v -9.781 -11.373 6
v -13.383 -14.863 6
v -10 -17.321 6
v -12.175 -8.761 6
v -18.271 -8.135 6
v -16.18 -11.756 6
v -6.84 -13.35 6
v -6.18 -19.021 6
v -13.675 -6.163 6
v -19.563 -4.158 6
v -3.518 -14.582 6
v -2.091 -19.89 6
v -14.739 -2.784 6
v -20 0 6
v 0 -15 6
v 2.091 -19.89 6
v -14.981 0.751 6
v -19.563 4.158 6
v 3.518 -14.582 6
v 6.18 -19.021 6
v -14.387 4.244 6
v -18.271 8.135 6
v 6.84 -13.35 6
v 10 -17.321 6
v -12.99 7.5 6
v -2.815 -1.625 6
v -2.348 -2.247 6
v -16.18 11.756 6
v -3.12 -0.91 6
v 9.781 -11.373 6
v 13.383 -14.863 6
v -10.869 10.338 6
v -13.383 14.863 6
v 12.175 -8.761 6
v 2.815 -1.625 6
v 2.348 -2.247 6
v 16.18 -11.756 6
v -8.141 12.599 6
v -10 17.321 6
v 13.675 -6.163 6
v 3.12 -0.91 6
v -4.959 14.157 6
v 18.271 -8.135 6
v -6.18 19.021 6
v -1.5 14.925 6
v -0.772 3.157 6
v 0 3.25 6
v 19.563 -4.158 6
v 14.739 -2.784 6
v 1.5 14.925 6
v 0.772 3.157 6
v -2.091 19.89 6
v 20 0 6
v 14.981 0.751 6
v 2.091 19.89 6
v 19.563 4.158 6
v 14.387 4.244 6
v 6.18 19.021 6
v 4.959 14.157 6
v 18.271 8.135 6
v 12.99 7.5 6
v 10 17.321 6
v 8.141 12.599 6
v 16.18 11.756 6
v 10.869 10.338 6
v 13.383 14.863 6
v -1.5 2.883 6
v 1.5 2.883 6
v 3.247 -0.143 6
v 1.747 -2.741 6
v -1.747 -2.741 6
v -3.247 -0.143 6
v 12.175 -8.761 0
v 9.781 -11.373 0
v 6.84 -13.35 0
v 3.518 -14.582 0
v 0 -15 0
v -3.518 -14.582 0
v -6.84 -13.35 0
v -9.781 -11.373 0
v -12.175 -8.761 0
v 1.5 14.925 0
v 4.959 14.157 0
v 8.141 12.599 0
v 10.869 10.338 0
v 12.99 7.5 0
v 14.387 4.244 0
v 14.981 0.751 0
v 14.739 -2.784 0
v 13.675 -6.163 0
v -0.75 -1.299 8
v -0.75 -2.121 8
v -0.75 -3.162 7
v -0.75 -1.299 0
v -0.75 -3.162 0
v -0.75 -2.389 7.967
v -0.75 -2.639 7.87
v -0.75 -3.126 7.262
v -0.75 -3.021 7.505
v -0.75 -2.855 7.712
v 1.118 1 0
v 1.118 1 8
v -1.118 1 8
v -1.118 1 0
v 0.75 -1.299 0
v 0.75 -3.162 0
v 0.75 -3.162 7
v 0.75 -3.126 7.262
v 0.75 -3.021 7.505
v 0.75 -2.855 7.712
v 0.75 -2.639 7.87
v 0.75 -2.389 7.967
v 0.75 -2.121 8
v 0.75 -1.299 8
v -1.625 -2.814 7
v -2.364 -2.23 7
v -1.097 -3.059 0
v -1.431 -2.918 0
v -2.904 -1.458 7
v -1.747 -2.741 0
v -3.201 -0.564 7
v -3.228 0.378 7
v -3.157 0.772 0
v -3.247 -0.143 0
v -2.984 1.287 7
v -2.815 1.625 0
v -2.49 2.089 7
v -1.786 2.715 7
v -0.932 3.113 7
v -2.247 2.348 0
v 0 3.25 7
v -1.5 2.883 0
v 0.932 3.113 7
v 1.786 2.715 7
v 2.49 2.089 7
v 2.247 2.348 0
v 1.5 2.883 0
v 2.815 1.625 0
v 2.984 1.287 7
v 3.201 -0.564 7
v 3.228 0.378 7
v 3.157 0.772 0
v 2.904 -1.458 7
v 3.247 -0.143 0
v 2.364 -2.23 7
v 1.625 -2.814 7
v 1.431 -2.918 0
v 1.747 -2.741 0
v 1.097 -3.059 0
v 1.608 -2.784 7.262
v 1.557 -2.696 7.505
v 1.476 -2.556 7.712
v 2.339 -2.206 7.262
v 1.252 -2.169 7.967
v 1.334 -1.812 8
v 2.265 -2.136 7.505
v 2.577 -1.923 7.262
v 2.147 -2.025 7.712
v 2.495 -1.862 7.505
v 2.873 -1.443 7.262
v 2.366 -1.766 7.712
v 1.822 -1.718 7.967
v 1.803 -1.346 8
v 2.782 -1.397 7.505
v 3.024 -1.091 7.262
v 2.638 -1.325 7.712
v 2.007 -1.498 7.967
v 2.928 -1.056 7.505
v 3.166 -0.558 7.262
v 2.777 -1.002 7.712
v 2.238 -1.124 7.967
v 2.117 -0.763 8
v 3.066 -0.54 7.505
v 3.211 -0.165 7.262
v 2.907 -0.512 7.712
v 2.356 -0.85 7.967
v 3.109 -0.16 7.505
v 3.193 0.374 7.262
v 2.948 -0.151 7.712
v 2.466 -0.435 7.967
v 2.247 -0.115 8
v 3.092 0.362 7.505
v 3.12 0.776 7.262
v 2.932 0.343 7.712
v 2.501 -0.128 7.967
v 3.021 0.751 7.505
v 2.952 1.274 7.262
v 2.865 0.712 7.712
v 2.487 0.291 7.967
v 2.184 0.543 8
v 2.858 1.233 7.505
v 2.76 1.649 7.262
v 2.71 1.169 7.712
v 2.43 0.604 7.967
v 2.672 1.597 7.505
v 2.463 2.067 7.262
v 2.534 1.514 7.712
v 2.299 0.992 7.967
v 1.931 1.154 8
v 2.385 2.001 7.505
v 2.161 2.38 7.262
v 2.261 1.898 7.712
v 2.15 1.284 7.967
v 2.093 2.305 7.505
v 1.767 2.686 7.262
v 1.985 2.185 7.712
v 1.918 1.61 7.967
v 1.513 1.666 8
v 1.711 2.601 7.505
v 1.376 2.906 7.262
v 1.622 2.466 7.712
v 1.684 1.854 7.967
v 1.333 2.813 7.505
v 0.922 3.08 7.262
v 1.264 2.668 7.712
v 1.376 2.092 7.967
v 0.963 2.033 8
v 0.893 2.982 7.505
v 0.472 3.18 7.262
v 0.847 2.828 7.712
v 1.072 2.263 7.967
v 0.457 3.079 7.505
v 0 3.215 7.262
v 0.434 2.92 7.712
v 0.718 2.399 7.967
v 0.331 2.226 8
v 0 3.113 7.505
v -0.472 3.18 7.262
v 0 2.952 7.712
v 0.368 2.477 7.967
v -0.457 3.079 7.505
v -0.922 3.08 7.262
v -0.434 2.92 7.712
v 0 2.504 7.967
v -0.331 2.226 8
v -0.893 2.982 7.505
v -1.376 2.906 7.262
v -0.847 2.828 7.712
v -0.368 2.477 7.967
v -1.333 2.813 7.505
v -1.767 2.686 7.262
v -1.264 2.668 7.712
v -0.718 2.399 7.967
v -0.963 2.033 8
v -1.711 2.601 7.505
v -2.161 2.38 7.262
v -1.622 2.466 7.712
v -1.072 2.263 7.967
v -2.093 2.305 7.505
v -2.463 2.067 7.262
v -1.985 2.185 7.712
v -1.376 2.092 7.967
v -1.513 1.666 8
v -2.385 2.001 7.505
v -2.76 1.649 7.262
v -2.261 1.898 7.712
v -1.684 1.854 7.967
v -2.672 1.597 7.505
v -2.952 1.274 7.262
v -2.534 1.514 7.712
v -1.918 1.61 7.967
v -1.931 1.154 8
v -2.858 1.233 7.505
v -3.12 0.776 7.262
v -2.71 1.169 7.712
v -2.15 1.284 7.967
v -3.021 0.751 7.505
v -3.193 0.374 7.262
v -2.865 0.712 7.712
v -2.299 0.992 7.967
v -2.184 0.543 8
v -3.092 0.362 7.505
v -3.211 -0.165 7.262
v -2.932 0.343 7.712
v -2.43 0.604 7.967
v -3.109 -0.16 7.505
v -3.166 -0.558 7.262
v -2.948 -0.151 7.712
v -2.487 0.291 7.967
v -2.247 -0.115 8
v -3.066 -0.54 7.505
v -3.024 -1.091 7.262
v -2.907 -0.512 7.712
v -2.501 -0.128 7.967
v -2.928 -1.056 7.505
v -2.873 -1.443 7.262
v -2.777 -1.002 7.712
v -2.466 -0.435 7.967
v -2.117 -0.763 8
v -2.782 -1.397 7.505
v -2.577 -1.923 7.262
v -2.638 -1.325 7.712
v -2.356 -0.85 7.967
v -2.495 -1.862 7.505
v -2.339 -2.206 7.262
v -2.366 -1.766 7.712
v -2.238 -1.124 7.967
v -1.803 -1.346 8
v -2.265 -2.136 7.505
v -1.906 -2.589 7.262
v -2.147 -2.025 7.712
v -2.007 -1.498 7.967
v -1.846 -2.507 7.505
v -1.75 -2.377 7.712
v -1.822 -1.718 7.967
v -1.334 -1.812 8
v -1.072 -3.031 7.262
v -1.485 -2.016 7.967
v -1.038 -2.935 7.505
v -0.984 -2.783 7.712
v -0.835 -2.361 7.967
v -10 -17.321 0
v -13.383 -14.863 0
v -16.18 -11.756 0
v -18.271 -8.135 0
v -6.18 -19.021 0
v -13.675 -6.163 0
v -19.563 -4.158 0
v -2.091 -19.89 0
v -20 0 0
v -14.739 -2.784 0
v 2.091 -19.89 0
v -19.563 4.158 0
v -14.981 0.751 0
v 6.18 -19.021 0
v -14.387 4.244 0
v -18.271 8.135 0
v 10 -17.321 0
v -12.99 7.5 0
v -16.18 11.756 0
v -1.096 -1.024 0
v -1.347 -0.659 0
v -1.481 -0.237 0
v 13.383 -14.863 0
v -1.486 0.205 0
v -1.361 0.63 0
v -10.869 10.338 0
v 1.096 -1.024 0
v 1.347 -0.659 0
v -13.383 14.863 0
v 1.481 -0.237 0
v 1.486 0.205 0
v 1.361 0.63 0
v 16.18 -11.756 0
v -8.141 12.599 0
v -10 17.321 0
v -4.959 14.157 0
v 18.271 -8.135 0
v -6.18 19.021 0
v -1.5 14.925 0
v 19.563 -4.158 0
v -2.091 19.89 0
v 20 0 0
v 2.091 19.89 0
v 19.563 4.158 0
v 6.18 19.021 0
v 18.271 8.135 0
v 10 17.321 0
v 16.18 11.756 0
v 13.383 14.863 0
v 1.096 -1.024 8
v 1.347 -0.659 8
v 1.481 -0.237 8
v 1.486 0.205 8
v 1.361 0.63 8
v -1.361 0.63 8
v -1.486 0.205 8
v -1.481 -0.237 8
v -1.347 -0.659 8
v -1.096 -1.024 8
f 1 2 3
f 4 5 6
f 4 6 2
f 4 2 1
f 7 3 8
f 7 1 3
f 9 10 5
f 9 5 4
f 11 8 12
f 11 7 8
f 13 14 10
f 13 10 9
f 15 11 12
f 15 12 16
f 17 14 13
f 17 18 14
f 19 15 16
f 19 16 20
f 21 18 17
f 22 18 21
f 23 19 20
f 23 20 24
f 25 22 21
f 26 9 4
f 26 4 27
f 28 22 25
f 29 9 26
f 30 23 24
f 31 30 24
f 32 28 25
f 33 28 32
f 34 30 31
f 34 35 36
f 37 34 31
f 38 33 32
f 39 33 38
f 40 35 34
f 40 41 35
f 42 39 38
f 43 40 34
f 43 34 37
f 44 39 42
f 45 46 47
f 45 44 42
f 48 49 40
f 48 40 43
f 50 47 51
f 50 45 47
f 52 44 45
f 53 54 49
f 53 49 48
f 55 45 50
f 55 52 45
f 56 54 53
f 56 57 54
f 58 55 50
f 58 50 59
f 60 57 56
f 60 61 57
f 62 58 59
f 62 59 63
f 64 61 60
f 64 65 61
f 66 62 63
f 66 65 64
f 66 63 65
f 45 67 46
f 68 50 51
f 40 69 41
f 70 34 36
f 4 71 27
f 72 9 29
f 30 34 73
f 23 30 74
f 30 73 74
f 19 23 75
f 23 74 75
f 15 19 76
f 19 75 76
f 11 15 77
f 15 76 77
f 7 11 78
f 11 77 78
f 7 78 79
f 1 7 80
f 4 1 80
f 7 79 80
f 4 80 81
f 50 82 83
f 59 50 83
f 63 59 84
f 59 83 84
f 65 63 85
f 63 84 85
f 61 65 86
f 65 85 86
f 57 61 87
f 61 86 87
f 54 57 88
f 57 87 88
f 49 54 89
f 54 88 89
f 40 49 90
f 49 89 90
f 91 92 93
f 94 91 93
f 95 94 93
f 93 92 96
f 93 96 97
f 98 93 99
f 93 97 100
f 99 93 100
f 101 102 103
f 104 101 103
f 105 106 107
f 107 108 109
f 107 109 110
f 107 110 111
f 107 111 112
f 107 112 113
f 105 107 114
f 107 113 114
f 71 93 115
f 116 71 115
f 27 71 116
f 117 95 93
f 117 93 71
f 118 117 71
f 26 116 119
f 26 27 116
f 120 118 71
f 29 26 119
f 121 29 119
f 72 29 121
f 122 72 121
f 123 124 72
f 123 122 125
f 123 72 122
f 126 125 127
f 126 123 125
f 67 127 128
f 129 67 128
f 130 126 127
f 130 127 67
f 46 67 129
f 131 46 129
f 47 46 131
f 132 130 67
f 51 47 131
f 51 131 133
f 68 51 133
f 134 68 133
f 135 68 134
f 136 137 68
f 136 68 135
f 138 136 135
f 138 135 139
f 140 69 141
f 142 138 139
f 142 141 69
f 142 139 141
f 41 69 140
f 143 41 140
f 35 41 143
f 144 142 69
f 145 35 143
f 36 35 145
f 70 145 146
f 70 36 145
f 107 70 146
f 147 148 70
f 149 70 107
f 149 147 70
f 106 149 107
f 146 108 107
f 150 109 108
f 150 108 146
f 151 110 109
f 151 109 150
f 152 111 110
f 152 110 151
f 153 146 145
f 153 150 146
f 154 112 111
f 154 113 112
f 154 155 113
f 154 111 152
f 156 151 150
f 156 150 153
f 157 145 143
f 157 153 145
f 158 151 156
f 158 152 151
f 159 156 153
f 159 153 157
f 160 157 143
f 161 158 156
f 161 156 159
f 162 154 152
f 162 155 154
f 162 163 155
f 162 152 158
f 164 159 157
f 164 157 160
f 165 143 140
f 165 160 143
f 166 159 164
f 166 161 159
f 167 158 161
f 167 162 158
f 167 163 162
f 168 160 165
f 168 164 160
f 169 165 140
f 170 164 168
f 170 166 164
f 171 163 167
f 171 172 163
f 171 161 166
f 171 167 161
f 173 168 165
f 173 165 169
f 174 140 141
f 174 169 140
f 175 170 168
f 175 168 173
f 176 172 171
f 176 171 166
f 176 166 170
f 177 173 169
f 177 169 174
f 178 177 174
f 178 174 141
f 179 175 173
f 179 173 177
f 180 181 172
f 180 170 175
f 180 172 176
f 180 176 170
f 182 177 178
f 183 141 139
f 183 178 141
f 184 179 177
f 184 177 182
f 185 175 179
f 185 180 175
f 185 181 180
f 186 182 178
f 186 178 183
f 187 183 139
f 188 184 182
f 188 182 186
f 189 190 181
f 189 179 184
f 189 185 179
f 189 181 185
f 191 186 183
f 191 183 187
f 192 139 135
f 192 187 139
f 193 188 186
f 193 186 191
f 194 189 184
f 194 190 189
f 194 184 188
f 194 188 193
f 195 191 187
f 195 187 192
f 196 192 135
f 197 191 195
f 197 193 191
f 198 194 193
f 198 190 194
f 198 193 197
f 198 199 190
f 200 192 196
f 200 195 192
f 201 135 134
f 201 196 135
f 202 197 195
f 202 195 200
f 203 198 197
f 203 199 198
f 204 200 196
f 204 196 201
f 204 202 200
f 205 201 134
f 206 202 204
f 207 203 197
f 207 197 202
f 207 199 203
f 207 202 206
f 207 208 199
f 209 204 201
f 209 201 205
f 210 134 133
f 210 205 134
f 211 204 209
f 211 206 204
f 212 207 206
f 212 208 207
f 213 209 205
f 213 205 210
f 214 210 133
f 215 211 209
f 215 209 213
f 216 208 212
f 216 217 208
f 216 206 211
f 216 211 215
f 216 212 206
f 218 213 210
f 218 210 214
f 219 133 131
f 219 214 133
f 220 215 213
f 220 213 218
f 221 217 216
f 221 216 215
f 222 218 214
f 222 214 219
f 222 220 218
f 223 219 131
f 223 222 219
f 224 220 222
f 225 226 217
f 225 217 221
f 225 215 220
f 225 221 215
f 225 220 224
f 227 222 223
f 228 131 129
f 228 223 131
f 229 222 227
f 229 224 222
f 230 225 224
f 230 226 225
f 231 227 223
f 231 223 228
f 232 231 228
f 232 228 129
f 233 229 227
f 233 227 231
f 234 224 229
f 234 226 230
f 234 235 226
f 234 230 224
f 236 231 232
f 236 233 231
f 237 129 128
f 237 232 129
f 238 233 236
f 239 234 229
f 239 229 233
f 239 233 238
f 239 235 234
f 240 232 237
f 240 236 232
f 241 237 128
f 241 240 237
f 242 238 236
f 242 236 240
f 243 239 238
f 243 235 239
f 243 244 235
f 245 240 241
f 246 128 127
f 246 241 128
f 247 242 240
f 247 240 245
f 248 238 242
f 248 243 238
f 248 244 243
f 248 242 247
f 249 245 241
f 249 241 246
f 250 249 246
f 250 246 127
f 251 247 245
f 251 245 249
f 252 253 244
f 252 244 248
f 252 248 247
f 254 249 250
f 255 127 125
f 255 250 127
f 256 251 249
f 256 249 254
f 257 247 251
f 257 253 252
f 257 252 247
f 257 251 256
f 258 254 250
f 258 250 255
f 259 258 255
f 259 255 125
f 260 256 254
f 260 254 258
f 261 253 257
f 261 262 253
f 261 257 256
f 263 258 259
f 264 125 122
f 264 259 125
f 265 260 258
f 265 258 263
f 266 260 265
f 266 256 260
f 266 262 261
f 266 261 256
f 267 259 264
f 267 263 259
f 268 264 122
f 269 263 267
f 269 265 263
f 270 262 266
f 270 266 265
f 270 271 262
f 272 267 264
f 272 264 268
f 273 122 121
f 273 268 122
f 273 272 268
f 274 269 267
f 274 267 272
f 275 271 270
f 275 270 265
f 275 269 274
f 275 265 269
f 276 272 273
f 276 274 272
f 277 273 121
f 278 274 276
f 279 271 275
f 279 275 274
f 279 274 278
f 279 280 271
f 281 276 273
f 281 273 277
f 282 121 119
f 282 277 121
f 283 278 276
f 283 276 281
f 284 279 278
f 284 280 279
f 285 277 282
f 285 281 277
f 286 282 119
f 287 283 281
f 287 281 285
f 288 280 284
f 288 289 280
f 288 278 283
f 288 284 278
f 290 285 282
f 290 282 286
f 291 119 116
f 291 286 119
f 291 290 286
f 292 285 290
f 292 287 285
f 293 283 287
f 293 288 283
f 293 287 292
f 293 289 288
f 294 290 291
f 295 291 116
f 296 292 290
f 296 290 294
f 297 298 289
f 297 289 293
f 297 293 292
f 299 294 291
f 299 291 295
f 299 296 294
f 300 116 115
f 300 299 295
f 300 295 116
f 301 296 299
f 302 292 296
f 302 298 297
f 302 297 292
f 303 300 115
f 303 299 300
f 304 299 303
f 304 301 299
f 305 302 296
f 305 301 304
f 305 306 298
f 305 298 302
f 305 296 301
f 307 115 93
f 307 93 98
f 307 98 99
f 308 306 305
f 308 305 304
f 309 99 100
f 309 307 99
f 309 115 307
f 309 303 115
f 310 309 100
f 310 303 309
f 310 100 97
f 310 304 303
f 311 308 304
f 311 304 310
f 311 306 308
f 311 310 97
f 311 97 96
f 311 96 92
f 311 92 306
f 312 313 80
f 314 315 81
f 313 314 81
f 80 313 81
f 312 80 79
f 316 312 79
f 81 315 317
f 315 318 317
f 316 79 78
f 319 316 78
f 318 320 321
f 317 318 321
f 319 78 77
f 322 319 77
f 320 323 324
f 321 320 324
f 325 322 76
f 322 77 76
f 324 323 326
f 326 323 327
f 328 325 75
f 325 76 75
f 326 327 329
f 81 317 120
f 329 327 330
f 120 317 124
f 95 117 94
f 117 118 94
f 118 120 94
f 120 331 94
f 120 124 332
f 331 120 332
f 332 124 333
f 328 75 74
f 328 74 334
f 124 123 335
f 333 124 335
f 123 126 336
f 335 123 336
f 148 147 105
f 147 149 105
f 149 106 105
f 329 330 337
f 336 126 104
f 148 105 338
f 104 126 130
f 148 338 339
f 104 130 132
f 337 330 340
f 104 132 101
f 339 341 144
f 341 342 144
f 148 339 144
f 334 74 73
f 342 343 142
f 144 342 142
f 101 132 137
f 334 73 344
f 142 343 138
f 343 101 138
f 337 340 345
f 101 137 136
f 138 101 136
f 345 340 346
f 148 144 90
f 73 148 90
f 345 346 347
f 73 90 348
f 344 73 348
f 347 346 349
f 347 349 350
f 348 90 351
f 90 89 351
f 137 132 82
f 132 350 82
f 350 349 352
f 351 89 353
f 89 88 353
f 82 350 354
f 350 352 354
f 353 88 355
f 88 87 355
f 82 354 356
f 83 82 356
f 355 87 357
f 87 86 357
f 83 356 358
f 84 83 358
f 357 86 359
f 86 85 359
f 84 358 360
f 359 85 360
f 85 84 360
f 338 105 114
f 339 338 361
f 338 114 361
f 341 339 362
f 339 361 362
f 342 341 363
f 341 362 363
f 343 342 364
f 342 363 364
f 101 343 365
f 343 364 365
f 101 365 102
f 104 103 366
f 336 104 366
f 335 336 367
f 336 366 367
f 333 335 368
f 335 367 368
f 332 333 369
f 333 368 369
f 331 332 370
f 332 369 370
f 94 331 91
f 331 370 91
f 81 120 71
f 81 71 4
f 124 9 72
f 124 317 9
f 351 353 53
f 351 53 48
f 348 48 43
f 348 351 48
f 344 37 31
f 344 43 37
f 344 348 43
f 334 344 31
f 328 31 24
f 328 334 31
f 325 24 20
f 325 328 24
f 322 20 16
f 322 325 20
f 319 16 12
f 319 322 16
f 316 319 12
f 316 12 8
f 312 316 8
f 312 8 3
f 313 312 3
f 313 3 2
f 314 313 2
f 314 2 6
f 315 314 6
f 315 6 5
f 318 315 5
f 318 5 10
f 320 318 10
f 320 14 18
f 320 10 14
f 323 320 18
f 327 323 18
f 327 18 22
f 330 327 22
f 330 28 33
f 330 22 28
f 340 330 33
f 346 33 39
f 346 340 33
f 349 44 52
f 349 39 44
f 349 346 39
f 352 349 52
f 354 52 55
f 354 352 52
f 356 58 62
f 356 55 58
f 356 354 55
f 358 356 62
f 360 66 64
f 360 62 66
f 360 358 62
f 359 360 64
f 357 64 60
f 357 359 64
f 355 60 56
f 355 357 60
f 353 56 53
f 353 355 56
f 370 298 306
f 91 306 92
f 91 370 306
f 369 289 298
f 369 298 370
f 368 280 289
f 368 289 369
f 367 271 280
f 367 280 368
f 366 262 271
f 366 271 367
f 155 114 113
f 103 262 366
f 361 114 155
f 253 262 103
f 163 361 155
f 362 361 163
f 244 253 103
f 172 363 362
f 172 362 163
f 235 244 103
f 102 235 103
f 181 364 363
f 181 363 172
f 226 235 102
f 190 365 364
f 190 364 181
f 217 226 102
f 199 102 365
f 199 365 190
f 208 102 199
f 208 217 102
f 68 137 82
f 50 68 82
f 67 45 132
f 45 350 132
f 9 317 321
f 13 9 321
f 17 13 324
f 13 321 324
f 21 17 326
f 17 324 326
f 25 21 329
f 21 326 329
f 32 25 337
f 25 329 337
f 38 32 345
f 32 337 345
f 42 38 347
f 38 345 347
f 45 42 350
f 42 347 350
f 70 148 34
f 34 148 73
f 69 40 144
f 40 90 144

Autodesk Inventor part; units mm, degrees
ref_plane "YZ Plane" through (0, 0, 0) normal (1, 0, 0) x (0, 1, 0)
ref_plane "XZ Plane" through (0, 0, 0) normal (0, 1, 0) x (-1, 0, 0)
ref_plane "XY Plane" through (0, 0, 0) normal (0, 0, 1) x (1, 0, 0)
sketch "Эскиз1" plane through (0, 0, 0) normal (0, 0, 1) x (1, 0, 0)
  circle A0 centre (0, 0) radius 20
  circle A1 centre (0, 0) radius 15
  circle A2 centre (0, 0) radius 3.25
  line L0 (0, 15) -> (12.9904, -7.5)
  line L1 (12.9904, -7.5) -> (-12.9904, -7.5)
  line L2 (-12.9904, -7.5) -> (0, 15)
  line L3 (1.5, -15) -> (1.5, 15)
  line L4 (1.5, 15) -> (-1.5, 15)
  line L5 (-1.5, 15) -> (-1.5, -15)
  line L6 (-1.5, -15) -> (1.5, -15)
  line L7 (1.5, -15) -> (-1.5, 15) construction
  line L8 (1.5, 15) -> (-1.5, -15) construction
  line L9 (13.7404, 6.201) -> (-12.2404, -8.799)
  line L10 (-12.2404, -8.799) -> (-13.7404, -6.201)
  line L11 (-13.7404, -6.201) -> (12.2404, 8.799)
  line L12 (12.2404, 8.799) -> (13.7404, 6.201)
  line L13 (13.7404, 6.201) -> (-13.7404, -6.201) construction
  line L14 (-12.2404, -8.799) -> (12.2404, 8.799) construction
  line L15 (-13.7404, 6.201) -> (12.2404, -8.799)
  line L16 (12.2404, -8.799) -> (13.7404, -6.201)
  line L17 (13.7404, -6.201) -> (-12.2404, 8.799)
  line L18 (-12.2404, 8.799) -> (-13.7404, 6.201)
  line L19 (-13.7404, 6.201) -> (13.7404, -6.201) construction
  line L20 (12.2404, -8.799) -> (-12.2404, 8.799) construction
  point P0 (1.5, 14.9248)
  point P1 (13.6753, -6.1634)
  point P2 (3.2469, -0.1425)
  point P3 (1.5, 2.8831)
  point P4 (1.7469, -2.7406)
  point P5 (12.1753, -8.7614)
  point P6 (-12.1753, -8.7614)
  point P7 (-1.7469, -2.7406)
  point P8 (-1.5, 14.9248)
  point P9 (-1.5, 2.8831)
  point P10 (-3.2469, -0.1425)
  point P11 (-13.6753, -6.1634)
  dimension "d1" = 30
  dimension "d0" = 40
  dimension "d2" = 6.5
  dimension "d3" = 3
  dimension "d4" = 3
  dimension "d5" = 3
extrude "Выдавливание1" add sketch "Эскиз1" along normal blind 6 contours A0 | A1 L12 L9 | L17 L16 A1 | A1 L0 L17 | A1 L11 L12 | L16 L15 A1 | L1 L15 A2 L17 L0 | A1 L15 L1 | L9 L17 L3 L11 A2 | A2 L17 L9 | A2 L15 L3 L9 L17 | L3 L0 A1 | A1 L4 L3 | L3 A2 L5 L2 L0 | L11 L3 A2 | L9 L3 L17 | L3 L6 A1 | A2 L3 L15 | L2 L5 A1 | A1 L5 L4 | L3 L11 L17 L5 A2 | L3 L17 L11 | L9 L15 L5 L11 L17 L3 | L3 L15 L9 | L6 L5 A1 | A2 L5 L9 L15 L3 | L5 L17 A2 | L11 L5 L17 | L9 L5 L15 | L9 A1 L1 | L1 L2 L11 A2 L9 | A2 L9 L5 | A1 L18 L17 | L17 L5 L11 L15 A2 | L5 L15 L11 | L9 A2 L11 L15 L5 | L9 L10 A1 | L10 L11 A1 | A1 L11 L2 | A1 L15 L18 | L15 L11 A2
sketch "Эскиз2" plane through (0, 0, 6) normal (0, 0, 1) x (1, 0, 0)
  circle A0 centre (0, 0) radius 3.25
extrude "Выдавливание2" add sketch "Эскиз2" along normal blind 2
sketch "Эскиз3" plane through (0, 0, 8) normal (0, 0, 1) x (1, 0, 0)
  circle A0 centre (0, 0) radius 1.5
  line L0 (-1.5, -1) -> (1.5, -1)
  line L1 (1.5, -1) -> (1.5, 1)
  line L2 (1.5, 1) -> (-1.5, 1)
  line L3 (-1.5, 1) -> (-1.5, -1)
  line L4 (-1.5, -1) -> (1.5, 1) construction
  line L5 (1.5, -1) -> (-1.5, 1) construction
  line L6 (0.75, 3.2651) -> (-0.75, 3.2651)
  line L7 (-0.75, 3.2651) -> (-0.75, -3.2651)
  line L8 (-0.75, -3.2651) -> (0.75, -3.2651)
  line L9 (0.75, -3.2651) -> (0.75, 3.2651)
  line L10 (0.75, 3.2651) -> (-0.75, -3.2651) construction
  line L11 (-0.75, 3.2651) -> (0.75, -3.2651) construction
  point P0 (-1.118, 1)
  point P1 (-0.75, -1.299)
  point P2 (0.75, -1.299)
  point P3 (1.118, 1)
  dimension "d10" = 3
  dimension "d11" = 2
  dimension "d12" = 1.5
extrude "Выдавливание3" cut sketch "Эскиз3" against normal through all contours A0 L0 L9 L2 | A0 L9 L0 | L9 L0 L7 L2 | L9 L8 L7 A0 | A0 L7 L0 L9 | L7 L0 A0 L2 | A0 L0 L7
fillet "Сопряжение1" radius 1 1 edges at (-3.25, 0, 8)
properties part number "Колесо D40 под ось моторов серии N"
